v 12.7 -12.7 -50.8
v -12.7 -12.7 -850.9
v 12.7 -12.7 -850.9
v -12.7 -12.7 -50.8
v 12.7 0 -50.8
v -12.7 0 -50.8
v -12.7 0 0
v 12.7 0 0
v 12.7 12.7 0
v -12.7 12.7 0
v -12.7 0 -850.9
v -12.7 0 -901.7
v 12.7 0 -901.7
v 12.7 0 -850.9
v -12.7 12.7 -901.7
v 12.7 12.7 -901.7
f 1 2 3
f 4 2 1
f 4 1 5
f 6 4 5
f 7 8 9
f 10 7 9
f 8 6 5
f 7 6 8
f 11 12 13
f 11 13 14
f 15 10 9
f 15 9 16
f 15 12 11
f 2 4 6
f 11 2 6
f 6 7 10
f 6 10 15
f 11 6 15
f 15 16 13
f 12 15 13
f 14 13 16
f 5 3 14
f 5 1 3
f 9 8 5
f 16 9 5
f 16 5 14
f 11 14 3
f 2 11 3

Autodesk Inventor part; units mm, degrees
ref_plane "YZ Plane" through (0, 0, 0) normal (1, 0, 0) x (0, 1, 0)
ref_plane "XZ Plane" through (0, 0, 0) normal (0, 1, 0) x (-1, 0, 0)
ref_plane "XY Plane" through (0, 0, 0) normal (0, 0, 1) x (1, 0, 0)
sketch "Sketch1" plane through (0, 0, 0) normal (1, 0, 0) x (0, 1, 0)
  line L0 (0, 0) -> (12.7, 0)
  line L1 (12.7, 0) -> (12.7, -901.7)
  line L2 (12.7, -901.7) -> (0, -901.7)
  line L3 (0, -901.7) -> (0, -850.9)
  line L4 (0, -850.9) -> (-12.7, -850.9)
  line L5 (-12.7, -850.9) -> (-12.7, -50.8)
  line L6 (-12.7, -50.8) -> (0, -50.8)
  line L7 (0, -50.8) -> (0, 0)
  dimension "d3" = 12.7
  dimension "d4" = 901.7
  dimension "d5" = 12.7
  dimension "d6" = 50.8
  dimension "d7" = 12.7
  dimension "d8" = 800.1
extrude "Extrusion1" add sketch "Sketch1" along normal mid plane 25.4
properties part number "door top" material "Wood (Cherry)"
